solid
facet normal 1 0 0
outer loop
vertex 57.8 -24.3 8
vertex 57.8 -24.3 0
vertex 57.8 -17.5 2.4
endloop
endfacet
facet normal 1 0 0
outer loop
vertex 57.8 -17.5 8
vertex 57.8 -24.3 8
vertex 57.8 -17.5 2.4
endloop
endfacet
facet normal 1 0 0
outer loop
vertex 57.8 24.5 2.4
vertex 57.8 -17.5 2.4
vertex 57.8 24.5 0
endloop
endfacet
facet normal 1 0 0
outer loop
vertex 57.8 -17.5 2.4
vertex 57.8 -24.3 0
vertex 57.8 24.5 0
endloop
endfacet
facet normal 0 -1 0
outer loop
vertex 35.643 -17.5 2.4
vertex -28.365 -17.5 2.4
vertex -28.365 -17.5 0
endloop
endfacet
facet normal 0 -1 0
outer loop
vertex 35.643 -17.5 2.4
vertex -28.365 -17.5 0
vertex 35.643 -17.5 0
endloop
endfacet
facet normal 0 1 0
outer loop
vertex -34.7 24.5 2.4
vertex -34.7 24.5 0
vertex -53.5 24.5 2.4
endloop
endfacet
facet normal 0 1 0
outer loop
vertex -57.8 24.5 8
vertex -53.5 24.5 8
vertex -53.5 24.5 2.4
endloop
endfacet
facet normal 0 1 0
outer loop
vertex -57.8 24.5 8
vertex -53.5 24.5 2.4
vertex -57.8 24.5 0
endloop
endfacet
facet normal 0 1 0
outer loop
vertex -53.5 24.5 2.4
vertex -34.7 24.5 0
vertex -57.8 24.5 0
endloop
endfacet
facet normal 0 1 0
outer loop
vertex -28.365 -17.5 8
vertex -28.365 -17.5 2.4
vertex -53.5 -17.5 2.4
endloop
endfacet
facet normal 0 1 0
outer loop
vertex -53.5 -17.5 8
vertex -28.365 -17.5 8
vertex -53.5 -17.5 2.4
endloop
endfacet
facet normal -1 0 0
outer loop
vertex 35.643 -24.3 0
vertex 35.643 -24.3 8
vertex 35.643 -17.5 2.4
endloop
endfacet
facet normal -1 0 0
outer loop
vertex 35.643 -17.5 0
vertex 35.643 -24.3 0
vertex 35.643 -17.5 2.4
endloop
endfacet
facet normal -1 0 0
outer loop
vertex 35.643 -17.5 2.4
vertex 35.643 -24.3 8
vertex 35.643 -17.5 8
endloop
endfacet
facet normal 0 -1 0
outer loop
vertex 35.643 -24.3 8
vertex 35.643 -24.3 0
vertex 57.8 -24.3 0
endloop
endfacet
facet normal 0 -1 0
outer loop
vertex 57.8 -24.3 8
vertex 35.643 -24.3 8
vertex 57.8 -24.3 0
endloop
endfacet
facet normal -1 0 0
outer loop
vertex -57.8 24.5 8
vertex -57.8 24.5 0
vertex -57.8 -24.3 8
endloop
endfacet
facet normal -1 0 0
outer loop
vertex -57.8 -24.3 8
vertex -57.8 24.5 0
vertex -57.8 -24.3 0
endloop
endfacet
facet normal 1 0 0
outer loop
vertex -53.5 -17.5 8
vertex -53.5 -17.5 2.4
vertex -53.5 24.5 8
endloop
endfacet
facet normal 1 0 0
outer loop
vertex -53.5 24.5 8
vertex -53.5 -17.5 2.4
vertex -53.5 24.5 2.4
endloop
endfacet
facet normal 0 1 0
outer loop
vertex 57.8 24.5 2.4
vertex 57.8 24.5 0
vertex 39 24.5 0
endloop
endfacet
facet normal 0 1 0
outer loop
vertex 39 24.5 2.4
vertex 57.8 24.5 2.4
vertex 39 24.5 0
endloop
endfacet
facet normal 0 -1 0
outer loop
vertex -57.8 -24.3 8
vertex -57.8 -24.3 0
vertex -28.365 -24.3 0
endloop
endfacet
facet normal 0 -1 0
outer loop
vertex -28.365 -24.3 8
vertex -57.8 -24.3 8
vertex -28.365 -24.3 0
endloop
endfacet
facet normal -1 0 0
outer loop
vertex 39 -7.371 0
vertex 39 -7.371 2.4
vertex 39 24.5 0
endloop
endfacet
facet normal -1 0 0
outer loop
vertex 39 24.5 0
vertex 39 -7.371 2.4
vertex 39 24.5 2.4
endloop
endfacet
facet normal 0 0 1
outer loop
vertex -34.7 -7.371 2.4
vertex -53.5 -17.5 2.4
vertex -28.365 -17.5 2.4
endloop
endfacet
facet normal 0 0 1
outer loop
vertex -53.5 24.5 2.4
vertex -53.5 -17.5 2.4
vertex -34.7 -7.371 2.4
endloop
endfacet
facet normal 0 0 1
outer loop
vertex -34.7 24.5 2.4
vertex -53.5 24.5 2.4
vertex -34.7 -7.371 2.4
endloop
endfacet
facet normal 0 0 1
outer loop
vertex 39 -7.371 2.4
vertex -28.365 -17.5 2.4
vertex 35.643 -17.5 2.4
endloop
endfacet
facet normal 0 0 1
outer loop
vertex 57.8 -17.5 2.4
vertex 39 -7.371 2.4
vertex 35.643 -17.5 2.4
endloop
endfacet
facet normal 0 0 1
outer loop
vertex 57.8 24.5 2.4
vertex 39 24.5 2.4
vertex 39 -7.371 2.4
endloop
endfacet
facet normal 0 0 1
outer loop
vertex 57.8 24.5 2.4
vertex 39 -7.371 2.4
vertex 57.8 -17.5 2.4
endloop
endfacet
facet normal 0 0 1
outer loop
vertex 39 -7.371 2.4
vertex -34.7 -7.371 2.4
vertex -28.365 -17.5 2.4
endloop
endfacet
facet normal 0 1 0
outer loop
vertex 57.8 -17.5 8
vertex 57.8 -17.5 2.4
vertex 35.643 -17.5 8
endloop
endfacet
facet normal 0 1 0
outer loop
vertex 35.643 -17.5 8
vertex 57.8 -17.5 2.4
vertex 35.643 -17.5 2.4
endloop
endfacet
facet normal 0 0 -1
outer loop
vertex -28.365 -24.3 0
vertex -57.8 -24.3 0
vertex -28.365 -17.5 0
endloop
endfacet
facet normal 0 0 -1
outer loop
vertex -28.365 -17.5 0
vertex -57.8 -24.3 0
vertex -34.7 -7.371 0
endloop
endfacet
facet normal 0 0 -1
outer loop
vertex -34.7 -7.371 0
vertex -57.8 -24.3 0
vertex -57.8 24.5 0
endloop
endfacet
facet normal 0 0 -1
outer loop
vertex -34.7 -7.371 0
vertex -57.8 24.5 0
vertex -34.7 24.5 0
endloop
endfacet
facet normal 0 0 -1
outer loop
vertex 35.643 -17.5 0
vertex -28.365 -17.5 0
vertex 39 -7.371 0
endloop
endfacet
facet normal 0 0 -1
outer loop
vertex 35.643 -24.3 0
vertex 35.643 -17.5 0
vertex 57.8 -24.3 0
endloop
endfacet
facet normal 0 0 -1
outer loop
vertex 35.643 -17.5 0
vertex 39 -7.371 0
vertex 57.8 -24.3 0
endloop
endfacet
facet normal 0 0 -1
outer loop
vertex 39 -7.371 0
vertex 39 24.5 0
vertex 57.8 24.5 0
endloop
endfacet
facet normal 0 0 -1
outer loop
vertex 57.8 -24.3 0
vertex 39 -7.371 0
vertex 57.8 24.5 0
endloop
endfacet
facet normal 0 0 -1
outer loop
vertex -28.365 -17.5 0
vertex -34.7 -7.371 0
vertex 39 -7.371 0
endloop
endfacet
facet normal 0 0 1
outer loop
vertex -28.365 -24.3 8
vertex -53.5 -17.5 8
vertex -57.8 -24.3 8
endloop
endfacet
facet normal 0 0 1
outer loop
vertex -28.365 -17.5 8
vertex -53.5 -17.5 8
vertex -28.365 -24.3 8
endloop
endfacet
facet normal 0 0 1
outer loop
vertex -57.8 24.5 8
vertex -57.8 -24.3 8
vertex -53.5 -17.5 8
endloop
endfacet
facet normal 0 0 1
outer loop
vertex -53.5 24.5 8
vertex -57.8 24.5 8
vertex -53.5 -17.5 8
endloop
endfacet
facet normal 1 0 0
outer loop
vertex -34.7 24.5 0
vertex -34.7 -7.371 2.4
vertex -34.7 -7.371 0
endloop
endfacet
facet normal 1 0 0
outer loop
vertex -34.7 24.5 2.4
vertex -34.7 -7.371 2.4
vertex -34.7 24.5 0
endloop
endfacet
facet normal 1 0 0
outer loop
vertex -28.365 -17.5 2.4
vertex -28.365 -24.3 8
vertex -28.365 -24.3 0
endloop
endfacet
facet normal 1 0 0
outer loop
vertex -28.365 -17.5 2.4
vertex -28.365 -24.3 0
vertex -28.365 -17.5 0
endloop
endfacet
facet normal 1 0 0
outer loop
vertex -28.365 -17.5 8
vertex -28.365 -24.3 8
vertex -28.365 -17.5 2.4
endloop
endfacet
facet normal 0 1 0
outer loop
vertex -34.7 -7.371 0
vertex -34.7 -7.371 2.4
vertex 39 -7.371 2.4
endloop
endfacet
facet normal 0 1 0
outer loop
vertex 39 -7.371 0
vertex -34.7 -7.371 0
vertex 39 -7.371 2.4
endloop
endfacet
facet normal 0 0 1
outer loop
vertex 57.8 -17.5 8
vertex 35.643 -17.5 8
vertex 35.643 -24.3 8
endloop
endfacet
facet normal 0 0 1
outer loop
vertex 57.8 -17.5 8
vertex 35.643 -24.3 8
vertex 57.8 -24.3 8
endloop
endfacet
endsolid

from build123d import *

# Parameters (mm, degrees)
F1_DEPTH = 2.4
F2_DEPTH = 8
F3_W     = 64.007707
F3_H     = 6.8
F4_DEPTH = 25
F5_W     = 73.7
F5_H     = 31.871149
F6_DEPTH = 25


with BuildPart() as f1:
    # F0 (on Top) → F1 (new body)
    with BuildSketch(Plane.XY):
        Polygon((-53.5, -17.5), (-53.5, 24.5), (-57.8, 24.5), (-57.8, -17.5), (-57.8, -24.3), (-53.5, -24.3), (53.1, -24.3), (57.8, -24.3), (57.8, -17.5), (53.1, -17.5), align=None)
        Polygon((53.1, 24.5), (-53.5, 24.5), (-53.5, -17.5), (53.1, -17.5), (57.8, -17.5), (57.8, 24.5), align=None)
    extrude(amount=F1_DEPTH)

    # F0 (on Top) → F2 (join)
    with BuildSketch(Plane.XY):
        Polygon((-53.5, -17.5), (-53.5, 24.5), (-57.8, 24.5), (-57.8, -17.5), (-57.8, -24.3), (-53.5, -24.3), (53.1, -24.3), (57.8, -24.3), (57.8, -17.5), (53.1, -17.5), align=None)
    extrude(amount=F2_DEPTH)

    # F3 (on face) → F4 (cut)
    with BuildSketch(Plane.XY.offset(8)):
        with Locations((3.638923, -20.9)):
            Rectangle(F3_W, F3_H)
    extrude(amount=-F4_DEPTH, mode=Mode.SUBTRACT)

    # F5 (on face) → F6 (cut)
    with BuildSketch(Plane.XY.offset(2.4)):
        with Locations((2.150001, 8.564426)):
            Rectangle(F5_W, F5_H)
    extrude(amount=-F6_DEPTH, mode=Mode.SUBTRACT)


solid = f1.part
